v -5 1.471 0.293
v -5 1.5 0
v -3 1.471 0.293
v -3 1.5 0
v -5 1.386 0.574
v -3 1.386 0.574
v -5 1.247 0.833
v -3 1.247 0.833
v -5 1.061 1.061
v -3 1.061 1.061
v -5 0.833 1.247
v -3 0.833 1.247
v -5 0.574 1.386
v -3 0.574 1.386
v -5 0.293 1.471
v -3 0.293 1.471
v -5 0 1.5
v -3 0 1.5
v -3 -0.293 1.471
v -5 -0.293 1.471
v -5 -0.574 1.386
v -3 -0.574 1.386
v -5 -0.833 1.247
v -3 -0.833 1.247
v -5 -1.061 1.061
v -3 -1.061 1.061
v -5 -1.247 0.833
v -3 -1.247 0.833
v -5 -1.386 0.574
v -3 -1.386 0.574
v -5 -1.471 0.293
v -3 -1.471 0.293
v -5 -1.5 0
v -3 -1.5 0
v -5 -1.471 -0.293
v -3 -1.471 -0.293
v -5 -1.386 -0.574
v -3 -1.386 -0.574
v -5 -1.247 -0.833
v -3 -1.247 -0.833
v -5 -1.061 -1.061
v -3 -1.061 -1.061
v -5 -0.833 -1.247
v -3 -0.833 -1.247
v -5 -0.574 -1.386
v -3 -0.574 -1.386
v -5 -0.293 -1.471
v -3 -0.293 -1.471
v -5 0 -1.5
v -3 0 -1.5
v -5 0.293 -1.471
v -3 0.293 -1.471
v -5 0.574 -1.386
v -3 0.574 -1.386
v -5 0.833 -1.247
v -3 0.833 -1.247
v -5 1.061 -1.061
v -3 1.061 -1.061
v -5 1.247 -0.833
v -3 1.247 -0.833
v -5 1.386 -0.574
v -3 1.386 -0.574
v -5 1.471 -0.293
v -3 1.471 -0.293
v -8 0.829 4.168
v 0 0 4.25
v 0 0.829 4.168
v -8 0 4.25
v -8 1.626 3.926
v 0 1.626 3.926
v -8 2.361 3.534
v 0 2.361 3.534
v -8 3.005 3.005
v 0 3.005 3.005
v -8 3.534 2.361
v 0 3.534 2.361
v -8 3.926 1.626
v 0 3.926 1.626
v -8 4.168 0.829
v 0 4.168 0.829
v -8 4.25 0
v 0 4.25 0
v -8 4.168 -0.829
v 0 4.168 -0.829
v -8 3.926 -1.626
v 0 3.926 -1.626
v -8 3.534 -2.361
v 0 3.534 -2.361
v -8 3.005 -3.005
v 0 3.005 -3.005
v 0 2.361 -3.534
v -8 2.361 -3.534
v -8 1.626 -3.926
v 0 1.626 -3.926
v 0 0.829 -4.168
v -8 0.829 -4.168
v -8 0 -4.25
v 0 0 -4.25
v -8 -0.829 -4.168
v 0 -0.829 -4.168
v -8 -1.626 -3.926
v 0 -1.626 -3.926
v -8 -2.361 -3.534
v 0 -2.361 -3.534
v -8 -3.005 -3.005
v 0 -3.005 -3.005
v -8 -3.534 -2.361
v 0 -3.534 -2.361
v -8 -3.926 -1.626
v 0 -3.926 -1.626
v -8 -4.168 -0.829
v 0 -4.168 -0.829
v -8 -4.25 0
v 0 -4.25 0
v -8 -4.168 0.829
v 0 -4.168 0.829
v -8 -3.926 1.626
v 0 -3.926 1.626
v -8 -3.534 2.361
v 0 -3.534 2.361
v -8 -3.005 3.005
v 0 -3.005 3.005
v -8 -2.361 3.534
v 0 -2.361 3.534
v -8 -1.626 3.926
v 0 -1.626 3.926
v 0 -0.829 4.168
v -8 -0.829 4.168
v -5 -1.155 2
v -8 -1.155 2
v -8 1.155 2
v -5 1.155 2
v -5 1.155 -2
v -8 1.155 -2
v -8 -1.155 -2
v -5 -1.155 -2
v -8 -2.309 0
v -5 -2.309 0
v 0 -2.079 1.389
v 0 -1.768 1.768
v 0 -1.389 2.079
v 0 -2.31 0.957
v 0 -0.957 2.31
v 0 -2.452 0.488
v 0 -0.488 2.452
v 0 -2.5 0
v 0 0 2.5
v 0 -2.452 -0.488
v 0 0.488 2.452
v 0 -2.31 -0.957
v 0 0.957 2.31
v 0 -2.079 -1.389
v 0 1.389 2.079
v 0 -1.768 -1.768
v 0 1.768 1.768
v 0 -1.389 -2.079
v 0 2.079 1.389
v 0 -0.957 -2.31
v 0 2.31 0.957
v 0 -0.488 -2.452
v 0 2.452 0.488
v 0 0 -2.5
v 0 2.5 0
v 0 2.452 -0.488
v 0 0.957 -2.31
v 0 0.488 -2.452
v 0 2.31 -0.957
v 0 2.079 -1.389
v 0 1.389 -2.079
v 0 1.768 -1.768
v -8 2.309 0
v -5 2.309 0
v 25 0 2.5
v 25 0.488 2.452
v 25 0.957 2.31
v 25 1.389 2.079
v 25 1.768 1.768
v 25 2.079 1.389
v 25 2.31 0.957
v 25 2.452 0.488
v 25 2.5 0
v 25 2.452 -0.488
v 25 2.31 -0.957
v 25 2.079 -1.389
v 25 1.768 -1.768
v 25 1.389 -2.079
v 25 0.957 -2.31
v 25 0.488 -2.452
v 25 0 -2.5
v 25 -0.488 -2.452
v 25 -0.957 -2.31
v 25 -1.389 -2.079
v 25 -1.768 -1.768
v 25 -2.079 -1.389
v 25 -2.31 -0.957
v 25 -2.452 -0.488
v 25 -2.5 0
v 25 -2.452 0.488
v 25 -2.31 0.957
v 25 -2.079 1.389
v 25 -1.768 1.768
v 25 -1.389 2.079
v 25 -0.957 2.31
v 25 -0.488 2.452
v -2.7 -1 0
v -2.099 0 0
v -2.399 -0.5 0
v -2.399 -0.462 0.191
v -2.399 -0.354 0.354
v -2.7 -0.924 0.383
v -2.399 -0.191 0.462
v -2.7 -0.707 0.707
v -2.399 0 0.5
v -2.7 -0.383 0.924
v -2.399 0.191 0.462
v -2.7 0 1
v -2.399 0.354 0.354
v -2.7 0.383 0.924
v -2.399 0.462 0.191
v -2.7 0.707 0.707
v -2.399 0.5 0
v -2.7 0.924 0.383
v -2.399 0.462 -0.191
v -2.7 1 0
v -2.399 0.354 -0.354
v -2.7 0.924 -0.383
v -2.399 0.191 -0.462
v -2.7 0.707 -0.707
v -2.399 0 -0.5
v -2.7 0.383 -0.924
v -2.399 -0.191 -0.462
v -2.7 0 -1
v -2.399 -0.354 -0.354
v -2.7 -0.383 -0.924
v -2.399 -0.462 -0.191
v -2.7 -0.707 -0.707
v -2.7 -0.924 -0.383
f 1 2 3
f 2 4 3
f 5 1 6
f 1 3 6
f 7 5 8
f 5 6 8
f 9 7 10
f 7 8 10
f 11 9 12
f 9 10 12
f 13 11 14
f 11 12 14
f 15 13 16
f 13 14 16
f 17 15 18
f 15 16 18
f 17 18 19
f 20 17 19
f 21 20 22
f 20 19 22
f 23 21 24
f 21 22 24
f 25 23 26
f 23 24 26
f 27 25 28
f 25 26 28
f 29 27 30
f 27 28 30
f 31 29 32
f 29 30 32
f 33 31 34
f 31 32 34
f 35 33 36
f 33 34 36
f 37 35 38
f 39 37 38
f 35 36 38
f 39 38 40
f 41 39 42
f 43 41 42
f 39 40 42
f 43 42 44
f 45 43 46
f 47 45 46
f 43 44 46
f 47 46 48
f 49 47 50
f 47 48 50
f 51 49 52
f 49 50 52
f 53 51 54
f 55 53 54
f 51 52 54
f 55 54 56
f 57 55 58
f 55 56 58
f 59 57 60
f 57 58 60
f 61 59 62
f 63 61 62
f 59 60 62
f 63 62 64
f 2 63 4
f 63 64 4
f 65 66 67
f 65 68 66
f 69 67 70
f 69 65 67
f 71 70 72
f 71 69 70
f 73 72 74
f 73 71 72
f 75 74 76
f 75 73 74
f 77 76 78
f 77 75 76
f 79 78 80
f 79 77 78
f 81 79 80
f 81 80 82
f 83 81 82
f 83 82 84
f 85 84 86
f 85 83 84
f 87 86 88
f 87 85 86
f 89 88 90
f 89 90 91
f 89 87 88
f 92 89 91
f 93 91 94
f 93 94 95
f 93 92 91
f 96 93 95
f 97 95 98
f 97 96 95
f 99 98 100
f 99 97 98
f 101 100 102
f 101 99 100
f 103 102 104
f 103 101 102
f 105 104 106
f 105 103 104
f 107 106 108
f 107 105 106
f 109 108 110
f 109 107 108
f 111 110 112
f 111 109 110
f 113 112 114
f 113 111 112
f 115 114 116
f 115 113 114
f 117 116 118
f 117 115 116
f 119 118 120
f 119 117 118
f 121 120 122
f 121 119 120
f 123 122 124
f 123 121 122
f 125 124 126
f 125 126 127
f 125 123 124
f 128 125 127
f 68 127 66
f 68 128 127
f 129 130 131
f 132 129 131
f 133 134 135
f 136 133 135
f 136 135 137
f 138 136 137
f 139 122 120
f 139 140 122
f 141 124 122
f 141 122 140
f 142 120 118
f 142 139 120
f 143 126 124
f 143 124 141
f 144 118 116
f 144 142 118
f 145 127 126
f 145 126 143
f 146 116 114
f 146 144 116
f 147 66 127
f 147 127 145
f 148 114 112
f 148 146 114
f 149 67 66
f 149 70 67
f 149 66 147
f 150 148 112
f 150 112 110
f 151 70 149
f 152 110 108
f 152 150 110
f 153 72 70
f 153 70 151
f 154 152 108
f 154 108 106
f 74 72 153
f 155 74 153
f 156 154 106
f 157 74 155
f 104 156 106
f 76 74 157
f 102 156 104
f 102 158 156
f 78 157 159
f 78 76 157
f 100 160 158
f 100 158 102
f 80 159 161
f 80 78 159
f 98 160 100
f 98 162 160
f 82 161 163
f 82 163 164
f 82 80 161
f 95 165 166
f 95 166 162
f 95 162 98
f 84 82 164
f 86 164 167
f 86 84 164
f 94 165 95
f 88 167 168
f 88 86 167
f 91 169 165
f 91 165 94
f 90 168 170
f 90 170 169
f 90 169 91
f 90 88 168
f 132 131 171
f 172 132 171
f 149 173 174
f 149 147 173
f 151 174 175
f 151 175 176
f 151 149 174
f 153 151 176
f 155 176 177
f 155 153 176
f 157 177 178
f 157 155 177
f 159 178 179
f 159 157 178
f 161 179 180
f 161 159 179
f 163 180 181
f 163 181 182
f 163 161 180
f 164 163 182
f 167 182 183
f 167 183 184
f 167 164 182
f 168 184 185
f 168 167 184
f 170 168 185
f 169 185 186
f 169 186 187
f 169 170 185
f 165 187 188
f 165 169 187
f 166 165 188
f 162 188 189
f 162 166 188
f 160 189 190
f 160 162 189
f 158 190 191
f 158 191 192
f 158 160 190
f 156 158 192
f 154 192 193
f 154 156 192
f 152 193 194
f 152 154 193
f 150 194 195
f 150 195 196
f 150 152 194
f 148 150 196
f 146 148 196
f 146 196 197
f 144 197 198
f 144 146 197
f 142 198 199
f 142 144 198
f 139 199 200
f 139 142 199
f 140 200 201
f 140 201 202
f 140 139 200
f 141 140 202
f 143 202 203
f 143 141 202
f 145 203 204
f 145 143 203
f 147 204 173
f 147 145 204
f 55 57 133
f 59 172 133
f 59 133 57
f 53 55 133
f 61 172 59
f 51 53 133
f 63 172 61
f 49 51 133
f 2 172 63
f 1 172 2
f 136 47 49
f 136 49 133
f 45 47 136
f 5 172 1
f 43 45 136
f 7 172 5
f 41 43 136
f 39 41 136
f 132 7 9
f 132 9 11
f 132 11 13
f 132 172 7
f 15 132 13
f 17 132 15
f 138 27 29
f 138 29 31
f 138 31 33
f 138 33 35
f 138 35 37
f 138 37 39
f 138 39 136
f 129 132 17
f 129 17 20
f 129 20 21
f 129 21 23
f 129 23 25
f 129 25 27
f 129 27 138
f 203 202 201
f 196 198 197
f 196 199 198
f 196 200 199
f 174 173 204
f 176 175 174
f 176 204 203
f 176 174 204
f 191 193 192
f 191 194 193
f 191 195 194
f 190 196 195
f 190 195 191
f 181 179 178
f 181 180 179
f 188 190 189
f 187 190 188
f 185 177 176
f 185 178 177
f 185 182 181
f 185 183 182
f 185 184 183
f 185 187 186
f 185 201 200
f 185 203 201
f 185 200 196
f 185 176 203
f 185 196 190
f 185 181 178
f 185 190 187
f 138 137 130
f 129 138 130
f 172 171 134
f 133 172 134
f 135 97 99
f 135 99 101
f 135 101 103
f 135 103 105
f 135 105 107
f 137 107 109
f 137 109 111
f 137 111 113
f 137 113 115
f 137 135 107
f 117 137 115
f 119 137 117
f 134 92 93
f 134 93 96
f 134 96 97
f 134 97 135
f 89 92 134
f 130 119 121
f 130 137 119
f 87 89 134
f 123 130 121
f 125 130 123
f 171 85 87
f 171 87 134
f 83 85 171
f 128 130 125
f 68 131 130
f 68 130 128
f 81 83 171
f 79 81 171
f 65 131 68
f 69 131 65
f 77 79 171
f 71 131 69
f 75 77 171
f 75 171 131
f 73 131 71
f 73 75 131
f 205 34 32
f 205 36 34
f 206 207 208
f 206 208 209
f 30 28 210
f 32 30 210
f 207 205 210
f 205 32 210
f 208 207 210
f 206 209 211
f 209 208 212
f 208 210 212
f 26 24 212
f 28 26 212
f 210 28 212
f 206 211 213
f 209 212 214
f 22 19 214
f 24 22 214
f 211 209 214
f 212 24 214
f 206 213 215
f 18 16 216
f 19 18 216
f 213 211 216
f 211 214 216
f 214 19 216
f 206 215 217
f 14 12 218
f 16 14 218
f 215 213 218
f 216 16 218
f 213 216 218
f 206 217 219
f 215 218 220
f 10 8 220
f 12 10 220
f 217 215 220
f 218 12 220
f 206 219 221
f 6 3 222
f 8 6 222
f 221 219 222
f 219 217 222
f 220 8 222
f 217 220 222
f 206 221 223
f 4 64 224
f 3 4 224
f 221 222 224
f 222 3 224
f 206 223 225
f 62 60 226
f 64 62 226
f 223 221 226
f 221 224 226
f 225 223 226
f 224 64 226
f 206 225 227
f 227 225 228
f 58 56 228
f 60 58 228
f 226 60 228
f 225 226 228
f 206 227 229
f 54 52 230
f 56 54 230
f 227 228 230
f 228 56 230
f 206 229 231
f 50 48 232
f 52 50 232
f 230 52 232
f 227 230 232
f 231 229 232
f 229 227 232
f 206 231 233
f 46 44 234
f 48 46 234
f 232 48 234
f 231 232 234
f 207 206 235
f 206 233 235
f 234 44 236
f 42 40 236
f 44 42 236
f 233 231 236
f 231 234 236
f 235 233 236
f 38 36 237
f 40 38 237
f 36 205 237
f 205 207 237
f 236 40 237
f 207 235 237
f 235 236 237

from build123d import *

# Parameters (mm, degrees)
F3_D     = 3
F3_DEPTH = 5
F3_TIP   = 0.9012909285
F4_DEPTH = 3


with BuildPart() as f1:
    # F0 (on Front) → F1 (revolve)
    with BuildSketch(Plane.XZ):
        Polygon((-8, 4.25), (-8, 0), (25, 0), (25, 2.5), (0, 2.5), (0, 4.25), align=None)
    revolve(axis=Axis((8.5, 0, 0), (-1, 0, 0)))

    # F3
    with Locations(Plane(origin=(-8, 0, 0), x_dir=(0, -1, 0), z_dir=(-1, 0, 0))):
        with Locations((0, 0)):
            Hole(F3_D / 2, depth=F3_DEPTH)
            with Locations((0, 0, -(F3_DEPTH + F3_TIP / 2))):  # 118° drill point
                Cone(0, F3_D / 2, F3_TIP, mode=Mode.SUBTRACT)

    # F2 (on face) → F4 (cut)
    with BuildSketch(Plane(origin=(-8, 0, 0), x_dir=(0, -1, 0), z_dir=(-1, 0, 0))):
        Polygon((-1.1547005384, -2), (1.1547005384, -2), (2.3094010768, 0), (1.1547005384, 2), (-1.1547005384, 2), (-2.3094010768, 0), align=None)
    extrude(amount=-F4_DEPTH, mode=Mode.SUBTRACT)


solid = f1.part
